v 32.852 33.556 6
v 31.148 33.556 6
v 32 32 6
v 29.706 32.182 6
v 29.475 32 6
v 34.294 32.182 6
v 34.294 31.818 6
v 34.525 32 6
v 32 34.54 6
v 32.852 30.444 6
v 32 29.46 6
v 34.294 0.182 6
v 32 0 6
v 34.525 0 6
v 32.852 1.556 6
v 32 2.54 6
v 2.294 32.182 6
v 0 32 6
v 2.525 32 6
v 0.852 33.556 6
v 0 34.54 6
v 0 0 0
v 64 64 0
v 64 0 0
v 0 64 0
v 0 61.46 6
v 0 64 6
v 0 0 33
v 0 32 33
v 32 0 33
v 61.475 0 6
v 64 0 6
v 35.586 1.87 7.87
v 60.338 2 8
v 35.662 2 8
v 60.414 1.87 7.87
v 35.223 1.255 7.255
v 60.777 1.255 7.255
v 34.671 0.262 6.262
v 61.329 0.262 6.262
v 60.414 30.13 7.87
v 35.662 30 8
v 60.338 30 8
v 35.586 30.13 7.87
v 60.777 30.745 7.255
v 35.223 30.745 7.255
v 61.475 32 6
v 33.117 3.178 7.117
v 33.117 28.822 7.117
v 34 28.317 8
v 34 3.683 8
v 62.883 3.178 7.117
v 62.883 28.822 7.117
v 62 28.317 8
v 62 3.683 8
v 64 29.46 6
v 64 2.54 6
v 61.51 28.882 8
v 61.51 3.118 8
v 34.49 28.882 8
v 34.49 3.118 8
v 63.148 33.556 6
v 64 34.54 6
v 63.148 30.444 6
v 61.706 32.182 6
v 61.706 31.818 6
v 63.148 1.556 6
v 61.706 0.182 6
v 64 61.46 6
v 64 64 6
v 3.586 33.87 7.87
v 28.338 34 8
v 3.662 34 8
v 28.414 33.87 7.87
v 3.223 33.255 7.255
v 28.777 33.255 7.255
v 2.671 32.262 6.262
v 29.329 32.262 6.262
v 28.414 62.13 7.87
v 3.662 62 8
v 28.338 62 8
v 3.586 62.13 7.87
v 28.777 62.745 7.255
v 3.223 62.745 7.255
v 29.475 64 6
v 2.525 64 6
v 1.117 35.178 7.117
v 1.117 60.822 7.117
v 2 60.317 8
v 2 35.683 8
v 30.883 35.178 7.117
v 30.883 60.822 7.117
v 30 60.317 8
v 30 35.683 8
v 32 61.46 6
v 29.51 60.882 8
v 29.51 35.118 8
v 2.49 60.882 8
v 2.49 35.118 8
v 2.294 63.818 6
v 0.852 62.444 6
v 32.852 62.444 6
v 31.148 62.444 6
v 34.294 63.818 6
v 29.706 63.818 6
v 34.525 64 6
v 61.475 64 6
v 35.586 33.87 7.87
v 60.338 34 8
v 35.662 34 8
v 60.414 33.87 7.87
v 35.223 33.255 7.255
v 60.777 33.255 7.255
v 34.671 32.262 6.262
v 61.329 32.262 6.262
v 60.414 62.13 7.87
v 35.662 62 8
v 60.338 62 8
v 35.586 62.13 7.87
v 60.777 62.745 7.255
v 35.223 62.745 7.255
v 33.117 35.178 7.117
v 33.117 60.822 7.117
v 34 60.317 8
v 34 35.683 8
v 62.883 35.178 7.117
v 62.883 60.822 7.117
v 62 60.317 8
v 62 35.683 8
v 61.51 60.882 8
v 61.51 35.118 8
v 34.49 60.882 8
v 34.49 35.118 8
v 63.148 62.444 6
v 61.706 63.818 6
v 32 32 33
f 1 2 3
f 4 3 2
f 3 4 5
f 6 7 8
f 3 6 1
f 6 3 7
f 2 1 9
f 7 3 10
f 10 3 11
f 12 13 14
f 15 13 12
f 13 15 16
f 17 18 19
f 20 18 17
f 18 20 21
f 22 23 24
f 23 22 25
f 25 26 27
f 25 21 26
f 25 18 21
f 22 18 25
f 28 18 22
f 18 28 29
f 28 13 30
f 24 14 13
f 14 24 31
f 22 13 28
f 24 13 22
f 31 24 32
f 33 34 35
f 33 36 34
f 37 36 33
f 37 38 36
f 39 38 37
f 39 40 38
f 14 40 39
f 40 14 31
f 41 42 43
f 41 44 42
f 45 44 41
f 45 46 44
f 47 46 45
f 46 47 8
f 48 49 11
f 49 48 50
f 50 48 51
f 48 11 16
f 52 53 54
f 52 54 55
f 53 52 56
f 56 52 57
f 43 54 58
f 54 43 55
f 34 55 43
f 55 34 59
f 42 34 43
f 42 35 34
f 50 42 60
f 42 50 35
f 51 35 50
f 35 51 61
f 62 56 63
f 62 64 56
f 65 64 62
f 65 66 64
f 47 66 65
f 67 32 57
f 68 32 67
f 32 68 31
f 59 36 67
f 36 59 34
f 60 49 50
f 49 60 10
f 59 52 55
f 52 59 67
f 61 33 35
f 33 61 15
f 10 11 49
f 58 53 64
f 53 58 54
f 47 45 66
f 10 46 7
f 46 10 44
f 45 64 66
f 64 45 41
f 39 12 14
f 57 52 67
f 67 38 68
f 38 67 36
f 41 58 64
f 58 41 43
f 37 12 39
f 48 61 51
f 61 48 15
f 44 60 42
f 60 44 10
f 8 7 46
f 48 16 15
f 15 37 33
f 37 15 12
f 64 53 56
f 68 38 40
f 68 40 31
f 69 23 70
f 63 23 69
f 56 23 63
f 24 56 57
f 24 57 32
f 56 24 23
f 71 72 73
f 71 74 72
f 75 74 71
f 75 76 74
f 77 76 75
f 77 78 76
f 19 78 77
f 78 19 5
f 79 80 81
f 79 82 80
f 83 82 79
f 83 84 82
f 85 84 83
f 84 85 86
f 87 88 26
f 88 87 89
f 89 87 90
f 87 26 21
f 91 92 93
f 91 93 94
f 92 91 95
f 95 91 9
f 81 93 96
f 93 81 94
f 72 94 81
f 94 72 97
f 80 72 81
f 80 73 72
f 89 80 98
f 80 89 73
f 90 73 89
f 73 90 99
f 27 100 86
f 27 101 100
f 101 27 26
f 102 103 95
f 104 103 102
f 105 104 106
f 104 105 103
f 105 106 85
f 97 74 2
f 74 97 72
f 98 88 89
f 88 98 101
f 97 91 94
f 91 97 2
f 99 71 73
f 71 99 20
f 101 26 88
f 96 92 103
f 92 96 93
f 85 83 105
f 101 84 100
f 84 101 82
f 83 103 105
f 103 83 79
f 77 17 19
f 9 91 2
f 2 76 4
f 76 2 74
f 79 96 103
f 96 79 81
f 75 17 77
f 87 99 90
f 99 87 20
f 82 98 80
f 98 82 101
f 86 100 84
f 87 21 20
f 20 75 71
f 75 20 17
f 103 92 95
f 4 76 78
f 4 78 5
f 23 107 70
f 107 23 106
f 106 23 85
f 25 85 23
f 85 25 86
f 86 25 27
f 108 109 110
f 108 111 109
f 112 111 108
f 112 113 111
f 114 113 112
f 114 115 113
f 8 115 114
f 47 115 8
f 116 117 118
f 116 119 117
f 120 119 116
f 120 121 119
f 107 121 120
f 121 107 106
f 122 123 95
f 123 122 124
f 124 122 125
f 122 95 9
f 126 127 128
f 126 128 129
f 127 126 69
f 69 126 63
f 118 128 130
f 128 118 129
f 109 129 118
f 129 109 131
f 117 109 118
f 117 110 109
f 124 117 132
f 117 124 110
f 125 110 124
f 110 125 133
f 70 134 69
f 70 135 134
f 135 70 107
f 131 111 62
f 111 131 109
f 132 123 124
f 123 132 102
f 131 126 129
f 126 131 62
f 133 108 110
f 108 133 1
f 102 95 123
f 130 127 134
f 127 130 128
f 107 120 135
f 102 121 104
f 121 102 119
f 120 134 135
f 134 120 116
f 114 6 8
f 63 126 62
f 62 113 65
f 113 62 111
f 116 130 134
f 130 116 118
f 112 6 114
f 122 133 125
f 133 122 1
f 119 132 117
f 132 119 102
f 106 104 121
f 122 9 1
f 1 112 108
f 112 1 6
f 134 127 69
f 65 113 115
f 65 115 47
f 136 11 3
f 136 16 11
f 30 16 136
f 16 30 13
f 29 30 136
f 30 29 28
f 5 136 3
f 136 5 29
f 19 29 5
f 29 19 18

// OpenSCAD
// file: WylochStyleDungeonLibrary.scad
//Constants
wallleft = 0;
wallbottom = 1;
wallright = 2;
walltop = 3;
wallcenter = 4;
walldoubleright = 5;


//Variables
size = 32;
baseheight = 6;
topperheight = 2;
topperrounded = true;
walllength = size;
wallheight = 25 + baseheight + topperheight;
wallwidth = 6;
wallwidththin = 4;


//Functions
function hypotenuse_ra(side_a, side_b) =
    sqrt(pow(side_a, 2) + pow(side_b, 2));
    
    
//Modules    
module wsdl_Base(s,bh)
{
    cube([s,s,bh]);
}

module wsdl_Topper(s,bh,th,tr)
{
    if (tr) {
        translate([0,0,bh])
            intersection() {
                difference () {
                        cube([s,s,th]);
                        union () {
                        rotate(a=45, v=[1,0,0])
                            cube([s,th*2,th*2]);
                        translate([0,s,0])
                            rotate(a=45, v=[1,0,0])
                                cube([s,th*2,th*2]);
                        rotate(a=-45, v=[0,1,0])
                            cube([th*2,s,th*2]);
                        translate([s,0,0])
                            rotate(a=-45, v=[0,1,0])
                                cube([th*2,s,th*2]);
                        }
                }
                translate([s/2,s/2,0])
                    cylinder(
                        h=th, 
                        r1=hypotenuse_ra(s/2-1.2, s/2-1.2), 
                        r2=hypotenuse_ra(s/2-th-.8, s/2-th-.8), 
                        center=false, 
                        $fa=.1);
            }    
    }
    else {
        translate([0,0,bh])
            difference() {
                cube([s,s,th]);
                union () {
                rotate(a=45, v=[1,0,0])
                    cube([s,th*2,th*2]);
                translate([0,s,0])
                    rotate(a=45, v=[1,0,0])
                        cube([s,th*2,th*2]);
                rotate(a=-45, v=[0,1,0])
                    cube([th*2,s,th*2]);
                translate([s,0,0])
                    rotate(a=-45, v=[0,1,0])
                        cube([th*2,s,th*2]);
                }
            }    
    }
}

module wsdl_Base_1x1(s,bh,th,tr) 
{
    union () {
        wsdl_Base(s,bh);
        wsdl_Topper(s,bh,th,tr);
    }
}

module wsdl_Base_1x2(s,bh,th,tr)
{
    union () {
        wsdl_Base_1x1(s,bh,th,tr);
        translate([s,0,0])
            wsdl_Base_1x1(s,bh,th,tr);
    }
}
 
module wsdl_Base_2x2(s,bh,th,tr)
{
    union () {
        wsdl_Base_1x2(s,bh,th,tr);
        translate([0,s,0])
            wsdl_Base_1x2(s,bh,th,tr);
    }
}
 
module wsdl_Base_2x4(s,bh,th,tr)
{
    union () {
        wsdl_Base_2x2(s,bh,th,tr);
        translate([s*2,0,0])
            wsdl_Base_2x2(s,bh,th,tr);
    }
}
 
module wsdl_Base_4x4(s,bh,th,tr)
{
    union () {
        wsdl_Base_2x4(s,bh,th,tr);
        translate([0,s*2,0])
            wsdl_Base_2x4(s,bh,th,tr);
    }
}
 
module wsdl_Wall_1(w,l,h)
{
    cube([w,l,h]);   
}

module wsdl_Wall_1_Position(w,l,h,p)
{
    if (p==0) {
        wsdl_Wall_1(w,l,h);
    }
    
    else if (p==1) {
        rotate(a=-90)
           translate([-w,0,0])
               wsdl_Wall_1(w,l,h);       
    }
    
    else if (p==2) {
        translate([(size)-w,0,0])
            wsdl_Wall_1(w,l,h);
    }
    
    else if (p==3) {
        rotate(a=-90)
            translate([-l,0,0])
                wsdl_Wall_1(w,l,h);
    }
    
    else if (p==4) {
        translate([(size)-w/2,0,0])
            wsdl_Wall_1(w,l,h);
    }
    
    else if (p==5) {
        translate([(size*2)-w,0,0])
           wsdl_Wall_1(w,l,h);       
    }
}

module wsdl_Wall_2(w,l,h)
{
    union() {
        wsdl_Wall_1(w,l,h);
        translate([0,l,0])
            wsdl_Wall_1(w,l,h);
    }
}

module wsdl_Wall_2_Position(w,l,h,p)
{
    if (p==0) {
        wsdl_Wall_2(w,l,h);
    }
    
    else if (p==1) {
        rotate(a=-90)
            translate([-w,0,0])
                wsdl_Wall_2(w,l,h);
    }
    
    else if (p==2) {
    translate([(size*2)-w,0,0])
        wsdl_Wall_2(w,l,h);
    }
    
    else if (p==3) {
        rotate(a=-90)
            translate([-l*2,0,0])
                wsdl_Wall_2(w,l,h);
    }
    
    else if (p==4) {
        translate([(size)-w/2,0,0])
            wsdl_Wall_2(w,l,h);
    }
}
// main file
include <WylochStyleDungeonLibrary.scad>; 

wsdl_Base_2x2(size,baseheight,topperheight,topperrounded);
//Create Pillar with modified wall
wsdl_Wall_1_Position(size,size,,wallheight,wallleft);
